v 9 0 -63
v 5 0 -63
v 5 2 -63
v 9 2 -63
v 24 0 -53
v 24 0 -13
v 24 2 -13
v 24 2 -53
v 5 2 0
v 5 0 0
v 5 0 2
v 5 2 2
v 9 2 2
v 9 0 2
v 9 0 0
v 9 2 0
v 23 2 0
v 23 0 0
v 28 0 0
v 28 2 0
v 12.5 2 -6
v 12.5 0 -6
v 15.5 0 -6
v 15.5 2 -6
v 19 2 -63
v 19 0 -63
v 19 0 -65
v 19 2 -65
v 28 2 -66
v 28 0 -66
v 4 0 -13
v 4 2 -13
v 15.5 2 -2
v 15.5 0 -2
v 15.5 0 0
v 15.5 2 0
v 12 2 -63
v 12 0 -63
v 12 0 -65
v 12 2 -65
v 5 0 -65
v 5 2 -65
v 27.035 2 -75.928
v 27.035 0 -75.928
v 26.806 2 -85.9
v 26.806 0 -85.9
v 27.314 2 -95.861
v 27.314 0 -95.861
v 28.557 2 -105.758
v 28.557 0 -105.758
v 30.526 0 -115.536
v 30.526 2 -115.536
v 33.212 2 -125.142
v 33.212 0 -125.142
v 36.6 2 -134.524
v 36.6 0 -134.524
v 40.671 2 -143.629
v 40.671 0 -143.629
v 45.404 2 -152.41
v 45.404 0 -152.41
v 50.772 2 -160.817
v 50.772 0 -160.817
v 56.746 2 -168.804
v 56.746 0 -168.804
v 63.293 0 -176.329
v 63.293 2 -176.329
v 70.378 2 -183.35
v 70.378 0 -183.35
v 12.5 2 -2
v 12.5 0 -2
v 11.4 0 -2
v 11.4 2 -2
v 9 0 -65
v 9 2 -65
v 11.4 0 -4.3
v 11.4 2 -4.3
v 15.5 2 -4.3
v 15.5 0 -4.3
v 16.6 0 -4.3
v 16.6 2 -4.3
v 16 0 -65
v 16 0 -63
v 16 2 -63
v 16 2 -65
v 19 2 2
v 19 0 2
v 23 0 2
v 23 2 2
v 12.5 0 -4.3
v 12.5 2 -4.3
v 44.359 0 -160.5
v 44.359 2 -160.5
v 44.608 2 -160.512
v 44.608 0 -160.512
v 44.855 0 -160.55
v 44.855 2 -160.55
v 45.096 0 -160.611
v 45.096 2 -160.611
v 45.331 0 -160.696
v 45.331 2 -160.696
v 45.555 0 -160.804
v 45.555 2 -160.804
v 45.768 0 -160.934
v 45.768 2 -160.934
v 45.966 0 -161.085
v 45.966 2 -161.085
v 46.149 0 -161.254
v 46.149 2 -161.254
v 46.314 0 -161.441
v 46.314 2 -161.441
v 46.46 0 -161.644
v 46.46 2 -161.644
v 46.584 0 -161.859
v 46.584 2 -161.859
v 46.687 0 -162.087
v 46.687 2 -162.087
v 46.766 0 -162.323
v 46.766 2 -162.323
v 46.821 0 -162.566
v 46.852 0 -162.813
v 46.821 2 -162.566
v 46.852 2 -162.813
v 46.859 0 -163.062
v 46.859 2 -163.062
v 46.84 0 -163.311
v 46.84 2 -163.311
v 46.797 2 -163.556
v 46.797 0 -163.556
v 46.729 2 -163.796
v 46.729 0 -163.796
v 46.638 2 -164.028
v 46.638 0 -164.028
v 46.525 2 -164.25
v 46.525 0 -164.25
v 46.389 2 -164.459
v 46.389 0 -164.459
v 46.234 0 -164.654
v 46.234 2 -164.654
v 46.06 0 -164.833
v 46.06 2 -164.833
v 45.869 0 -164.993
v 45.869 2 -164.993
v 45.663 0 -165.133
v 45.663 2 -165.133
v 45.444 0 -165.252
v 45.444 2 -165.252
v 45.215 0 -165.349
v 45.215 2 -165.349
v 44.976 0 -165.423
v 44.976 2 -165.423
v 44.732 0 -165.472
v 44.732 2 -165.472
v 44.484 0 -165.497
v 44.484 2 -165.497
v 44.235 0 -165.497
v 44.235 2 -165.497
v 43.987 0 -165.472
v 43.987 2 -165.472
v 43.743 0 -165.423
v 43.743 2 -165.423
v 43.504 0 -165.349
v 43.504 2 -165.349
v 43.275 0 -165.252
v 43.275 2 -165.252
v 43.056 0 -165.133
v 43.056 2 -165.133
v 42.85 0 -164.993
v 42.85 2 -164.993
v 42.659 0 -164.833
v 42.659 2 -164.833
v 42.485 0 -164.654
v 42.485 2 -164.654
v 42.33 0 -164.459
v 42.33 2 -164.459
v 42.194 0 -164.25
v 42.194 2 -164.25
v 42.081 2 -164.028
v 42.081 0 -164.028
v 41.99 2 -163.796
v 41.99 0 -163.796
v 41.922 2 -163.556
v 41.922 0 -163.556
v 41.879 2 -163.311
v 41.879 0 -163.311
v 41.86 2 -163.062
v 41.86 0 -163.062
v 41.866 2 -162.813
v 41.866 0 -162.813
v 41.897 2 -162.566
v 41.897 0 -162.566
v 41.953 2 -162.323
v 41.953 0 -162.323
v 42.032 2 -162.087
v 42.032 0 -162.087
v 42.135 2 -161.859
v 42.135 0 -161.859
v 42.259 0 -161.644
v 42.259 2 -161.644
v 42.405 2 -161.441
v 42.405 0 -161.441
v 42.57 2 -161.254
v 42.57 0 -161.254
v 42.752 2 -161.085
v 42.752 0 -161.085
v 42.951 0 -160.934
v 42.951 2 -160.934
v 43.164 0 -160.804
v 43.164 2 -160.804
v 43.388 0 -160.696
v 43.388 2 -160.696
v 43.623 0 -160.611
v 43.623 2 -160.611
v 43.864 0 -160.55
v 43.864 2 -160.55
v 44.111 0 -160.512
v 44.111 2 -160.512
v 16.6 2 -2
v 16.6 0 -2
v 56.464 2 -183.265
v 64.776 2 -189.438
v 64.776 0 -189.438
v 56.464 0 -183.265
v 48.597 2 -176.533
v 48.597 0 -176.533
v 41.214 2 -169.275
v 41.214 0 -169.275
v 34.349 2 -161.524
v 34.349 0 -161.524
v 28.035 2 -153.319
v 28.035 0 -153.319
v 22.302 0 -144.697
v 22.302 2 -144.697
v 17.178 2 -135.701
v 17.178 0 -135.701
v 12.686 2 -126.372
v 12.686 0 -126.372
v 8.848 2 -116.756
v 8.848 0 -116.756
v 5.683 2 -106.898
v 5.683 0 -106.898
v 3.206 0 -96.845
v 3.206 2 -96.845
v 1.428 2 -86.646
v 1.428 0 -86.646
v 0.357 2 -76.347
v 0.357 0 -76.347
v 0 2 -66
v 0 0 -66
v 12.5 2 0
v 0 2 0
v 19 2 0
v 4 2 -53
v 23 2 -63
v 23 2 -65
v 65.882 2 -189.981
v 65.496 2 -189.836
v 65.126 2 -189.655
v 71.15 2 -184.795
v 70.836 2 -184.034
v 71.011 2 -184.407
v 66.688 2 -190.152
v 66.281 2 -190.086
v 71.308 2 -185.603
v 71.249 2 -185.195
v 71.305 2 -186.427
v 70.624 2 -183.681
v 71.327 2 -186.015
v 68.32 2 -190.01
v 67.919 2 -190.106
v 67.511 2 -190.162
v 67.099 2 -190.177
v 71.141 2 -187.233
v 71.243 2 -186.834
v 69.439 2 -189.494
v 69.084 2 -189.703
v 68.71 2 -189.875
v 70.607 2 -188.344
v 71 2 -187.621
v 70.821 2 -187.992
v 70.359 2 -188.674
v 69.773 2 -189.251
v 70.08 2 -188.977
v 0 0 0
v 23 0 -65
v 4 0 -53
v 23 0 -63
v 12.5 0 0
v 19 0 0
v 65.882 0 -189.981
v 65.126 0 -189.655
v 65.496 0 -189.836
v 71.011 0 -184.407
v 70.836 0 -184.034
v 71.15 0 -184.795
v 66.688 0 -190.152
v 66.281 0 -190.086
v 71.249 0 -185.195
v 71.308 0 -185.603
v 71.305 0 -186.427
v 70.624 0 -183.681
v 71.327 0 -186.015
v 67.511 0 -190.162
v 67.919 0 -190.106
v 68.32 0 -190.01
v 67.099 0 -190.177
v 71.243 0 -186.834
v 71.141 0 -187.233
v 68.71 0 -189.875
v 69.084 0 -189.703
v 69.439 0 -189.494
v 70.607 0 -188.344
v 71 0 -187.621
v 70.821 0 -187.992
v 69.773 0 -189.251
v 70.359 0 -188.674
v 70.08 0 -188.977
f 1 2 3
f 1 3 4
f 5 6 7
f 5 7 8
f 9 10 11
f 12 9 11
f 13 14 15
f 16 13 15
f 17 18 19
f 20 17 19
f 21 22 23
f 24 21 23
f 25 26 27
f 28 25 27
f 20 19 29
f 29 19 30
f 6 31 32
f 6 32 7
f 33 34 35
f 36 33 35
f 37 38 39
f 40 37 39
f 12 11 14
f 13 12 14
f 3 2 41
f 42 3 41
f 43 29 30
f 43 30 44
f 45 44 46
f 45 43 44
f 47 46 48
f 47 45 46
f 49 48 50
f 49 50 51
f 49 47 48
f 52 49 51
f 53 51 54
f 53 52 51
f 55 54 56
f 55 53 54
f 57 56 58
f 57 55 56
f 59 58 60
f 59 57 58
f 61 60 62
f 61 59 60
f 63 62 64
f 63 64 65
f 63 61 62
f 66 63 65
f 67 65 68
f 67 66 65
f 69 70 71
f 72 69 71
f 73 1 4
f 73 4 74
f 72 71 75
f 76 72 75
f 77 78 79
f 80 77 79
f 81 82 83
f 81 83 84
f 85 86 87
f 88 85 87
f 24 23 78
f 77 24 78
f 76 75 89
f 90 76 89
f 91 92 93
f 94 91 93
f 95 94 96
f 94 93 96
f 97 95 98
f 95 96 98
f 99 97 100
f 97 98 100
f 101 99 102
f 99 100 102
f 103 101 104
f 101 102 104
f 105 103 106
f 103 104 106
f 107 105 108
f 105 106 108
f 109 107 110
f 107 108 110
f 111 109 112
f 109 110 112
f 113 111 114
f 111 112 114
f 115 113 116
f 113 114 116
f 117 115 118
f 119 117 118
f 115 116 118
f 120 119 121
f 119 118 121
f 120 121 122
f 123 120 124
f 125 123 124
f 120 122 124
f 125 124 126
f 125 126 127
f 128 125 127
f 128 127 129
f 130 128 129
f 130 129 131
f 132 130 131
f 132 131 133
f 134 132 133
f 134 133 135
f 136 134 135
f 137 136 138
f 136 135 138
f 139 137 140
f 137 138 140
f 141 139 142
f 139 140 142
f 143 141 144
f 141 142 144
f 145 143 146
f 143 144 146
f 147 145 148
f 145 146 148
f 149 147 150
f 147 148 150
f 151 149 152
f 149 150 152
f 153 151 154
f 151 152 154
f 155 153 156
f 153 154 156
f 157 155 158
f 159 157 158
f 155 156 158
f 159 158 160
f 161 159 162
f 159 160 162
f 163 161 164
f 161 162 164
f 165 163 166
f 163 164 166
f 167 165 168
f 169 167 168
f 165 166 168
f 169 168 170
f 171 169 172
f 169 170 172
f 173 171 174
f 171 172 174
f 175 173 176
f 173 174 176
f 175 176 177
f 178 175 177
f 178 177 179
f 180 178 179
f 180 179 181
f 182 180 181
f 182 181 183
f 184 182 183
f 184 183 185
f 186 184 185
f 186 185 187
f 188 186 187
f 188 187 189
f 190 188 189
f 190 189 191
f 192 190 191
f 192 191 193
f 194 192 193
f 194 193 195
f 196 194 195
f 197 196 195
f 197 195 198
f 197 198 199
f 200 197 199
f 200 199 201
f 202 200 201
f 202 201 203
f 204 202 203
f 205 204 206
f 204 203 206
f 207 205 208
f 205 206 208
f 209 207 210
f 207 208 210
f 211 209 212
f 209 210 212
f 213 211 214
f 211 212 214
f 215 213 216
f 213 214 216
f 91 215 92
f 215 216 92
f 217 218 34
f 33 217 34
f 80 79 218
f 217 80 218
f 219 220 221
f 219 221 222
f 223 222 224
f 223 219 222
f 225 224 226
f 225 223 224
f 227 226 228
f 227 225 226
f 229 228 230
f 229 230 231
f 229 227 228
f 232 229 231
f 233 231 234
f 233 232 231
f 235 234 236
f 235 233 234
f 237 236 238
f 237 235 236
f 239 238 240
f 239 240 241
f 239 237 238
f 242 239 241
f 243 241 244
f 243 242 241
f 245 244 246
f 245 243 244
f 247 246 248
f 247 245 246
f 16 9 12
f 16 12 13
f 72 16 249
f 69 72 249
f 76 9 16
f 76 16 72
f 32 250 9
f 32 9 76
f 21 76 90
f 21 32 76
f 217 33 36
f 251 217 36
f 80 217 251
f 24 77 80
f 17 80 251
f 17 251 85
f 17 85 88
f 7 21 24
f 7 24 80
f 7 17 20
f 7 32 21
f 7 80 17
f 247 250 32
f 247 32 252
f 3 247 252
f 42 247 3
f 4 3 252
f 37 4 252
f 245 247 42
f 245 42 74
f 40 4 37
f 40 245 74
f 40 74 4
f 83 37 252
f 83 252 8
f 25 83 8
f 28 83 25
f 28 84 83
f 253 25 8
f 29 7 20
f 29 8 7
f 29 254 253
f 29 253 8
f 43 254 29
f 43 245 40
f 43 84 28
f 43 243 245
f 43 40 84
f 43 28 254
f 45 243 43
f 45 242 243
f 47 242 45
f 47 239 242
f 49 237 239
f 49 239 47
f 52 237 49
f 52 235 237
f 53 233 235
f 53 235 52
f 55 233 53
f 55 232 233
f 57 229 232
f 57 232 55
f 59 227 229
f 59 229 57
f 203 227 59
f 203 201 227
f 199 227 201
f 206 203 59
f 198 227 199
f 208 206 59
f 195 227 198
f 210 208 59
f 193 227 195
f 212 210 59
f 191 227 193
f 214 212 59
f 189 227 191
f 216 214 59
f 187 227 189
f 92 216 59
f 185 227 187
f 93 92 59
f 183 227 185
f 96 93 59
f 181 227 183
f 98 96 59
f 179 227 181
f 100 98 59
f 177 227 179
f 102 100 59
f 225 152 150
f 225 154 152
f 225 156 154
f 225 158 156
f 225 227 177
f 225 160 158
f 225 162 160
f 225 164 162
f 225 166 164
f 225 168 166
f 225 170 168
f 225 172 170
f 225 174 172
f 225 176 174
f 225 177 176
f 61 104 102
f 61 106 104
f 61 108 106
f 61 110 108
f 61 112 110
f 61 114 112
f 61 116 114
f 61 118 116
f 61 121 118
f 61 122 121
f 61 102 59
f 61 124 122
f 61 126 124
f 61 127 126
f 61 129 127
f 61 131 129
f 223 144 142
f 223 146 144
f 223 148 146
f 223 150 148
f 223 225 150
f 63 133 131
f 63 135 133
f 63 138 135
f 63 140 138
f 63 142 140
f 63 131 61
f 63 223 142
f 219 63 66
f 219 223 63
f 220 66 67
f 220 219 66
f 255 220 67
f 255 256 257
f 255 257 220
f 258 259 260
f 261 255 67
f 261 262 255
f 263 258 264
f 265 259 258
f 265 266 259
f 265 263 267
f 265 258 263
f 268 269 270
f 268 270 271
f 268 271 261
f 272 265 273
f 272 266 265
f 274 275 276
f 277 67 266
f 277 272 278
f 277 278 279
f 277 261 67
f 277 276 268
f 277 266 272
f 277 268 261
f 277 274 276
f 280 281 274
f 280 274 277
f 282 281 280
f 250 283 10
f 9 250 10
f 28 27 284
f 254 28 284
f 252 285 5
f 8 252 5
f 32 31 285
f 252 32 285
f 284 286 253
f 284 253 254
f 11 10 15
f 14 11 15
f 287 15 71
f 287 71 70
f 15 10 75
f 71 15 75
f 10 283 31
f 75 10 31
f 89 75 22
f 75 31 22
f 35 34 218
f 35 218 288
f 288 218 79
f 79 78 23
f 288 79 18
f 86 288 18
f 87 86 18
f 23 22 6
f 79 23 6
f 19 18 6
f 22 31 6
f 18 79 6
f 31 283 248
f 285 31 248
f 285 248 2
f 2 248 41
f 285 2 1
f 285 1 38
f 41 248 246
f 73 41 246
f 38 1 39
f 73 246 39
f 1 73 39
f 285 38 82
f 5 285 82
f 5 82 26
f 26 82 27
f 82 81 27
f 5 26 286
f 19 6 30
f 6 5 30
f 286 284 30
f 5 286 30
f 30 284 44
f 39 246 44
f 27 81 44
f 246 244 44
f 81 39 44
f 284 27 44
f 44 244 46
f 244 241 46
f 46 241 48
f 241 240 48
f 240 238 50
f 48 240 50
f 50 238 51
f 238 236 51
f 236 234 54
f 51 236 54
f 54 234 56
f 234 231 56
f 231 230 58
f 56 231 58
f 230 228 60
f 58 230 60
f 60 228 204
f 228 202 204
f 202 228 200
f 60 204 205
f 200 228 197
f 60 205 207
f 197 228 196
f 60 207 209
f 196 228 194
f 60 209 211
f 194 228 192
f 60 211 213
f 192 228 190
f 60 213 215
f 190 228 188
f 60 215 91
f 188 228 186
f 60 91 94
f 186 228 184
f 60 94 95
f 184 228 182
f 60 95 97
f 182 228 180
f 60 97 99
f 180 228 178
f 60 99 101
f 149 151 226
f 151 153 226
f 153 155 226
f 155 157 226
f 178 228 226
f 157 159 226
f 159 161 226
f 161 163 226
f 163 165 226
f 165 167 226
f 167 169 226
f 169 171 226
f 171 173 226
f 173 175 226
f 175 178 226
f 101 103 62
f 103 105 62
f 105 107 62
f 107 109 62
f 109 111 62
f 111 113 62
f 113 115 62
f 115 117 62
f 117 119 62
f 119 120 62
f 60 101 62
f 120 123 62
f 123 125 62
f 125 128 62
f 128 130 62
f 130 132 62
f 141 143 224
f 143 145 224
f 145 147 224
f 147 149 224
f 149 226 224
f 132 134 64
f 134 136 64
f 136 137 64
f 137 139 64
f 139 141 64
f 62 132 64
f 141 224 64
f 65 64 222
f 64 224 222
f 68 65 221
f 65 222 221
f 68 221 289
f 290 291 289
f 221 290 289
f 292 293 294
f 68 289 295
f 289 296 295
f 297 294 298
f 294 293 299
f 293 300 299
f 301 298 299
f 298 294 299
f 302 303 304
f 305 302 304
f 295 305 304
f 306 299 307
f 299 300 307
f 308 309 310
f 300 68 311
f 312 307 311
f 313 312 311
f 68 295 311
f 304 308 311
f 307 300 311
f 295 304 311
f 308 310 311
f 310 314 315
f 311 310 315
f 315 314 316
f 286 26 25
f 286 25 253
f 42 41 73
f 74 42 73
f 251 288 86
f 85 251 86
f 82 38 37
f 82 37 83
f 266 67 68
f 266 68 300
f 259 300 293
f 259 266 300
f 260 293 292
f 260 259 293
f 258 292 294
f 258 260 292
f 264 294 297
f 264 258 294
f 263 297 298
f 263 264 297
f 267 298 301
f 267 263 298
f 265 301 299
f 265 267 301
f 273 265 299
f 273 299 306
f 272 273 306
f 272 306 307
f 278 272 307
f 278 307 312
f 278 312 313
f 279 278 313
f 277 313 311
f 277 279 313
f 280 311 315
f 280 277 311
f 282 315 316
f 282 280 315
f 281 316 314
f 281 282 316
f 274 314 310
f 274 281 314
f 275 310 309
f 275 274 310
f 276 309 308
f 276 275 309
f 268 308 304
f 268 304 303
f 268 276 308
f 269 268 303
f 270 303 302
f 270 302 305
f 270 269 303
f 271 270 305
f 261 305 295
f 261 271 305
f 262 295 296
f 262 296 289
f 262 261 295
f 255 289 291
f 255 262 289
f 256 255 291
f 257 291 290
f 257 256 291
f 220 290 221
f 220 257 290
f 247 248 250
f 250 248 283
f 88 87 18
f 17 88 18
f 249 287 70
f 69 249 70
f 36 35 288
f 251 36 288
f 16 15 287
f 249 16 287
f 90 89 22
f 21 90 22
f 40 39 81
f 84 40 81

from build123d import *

# Parameters (mm, degrees)
SKETCH1_W           = 20
SKETCH1_H           = 40
SKETCH1_W_2         = 4
SKETCH1_H_2         = 2
BOSS_EXTRUDE1_DEPTH = 2
BOSS_EXTRUDE2_DEPTH = 2
SKETCH3_R           = 2.5
CUT_EXTRUDE1_DEPTH  = 2


with BuildPart() as part:
    # Sketch1 → Boss-Extrude1 (new body)
    with BuildSketch(Plane(origin=(0, 0, 0), x_dir=(1, 0, 0), z_dir=(0, 1, 0))):
        Polygon((0, 0), (5, 0), (5, -2), (9, -2), (9, 0), (12.5, 0), (12.5, 2), (11.4, 2), (11.4, 4.3), (12.5, 4.3), (12.5, 6), (15.5, 6), (15.5, 4.3), (16.6, 4.3), (16.6, 2), (15.5, 2), (15.5, 0), (19, 0), (19, -2), (23, -2), (23, 0), (28, 0), (28, 66), (0, 66), align=None)
        with Locations((14, 33)):
            Rectangle(SKETCH1_W, SKETCH1_H, mode=Mode.SUBTRACT)
        with Locations((7, 64)):
            Rectangle(SKETCH1_W_2, SKETCH1_H_2, mode=Mode.SUBTRACT)
        with Locations((21, 64)):
            Rectangle(SKETCH1_W_2, SKETCH1_H_2, mode=Mode.SUBTRACT)
        with Locations((14, 64)):
            Rectangle(SKETCH1_W_2, SKETCH1_H_2, mode=Mode.SUBTRACT)
    extrude(amount=BOSS_EXTRUDE1_DEPTH)

    # Sketch2 → Boss-Extrude2 (add)
    with BuildSketch(Plane(origin=(0, 2, 0), x_dir=(1, 0, 0), z_dir=(0, 1, 0))):
        with BuildLine():
            Line((0, 66), (28, 66))
            ThreePointArc((28, 66), (34.819271185, 129.864214399), (70.378490249, 183.349560802))
            ThreePointArc((70.378490249, 183.349560802), (70.223472253, 188.82876401), (64.776007814, 189.43772177))
            ThreePointArc((64.776007814, 189.43772177), (17.177564343, 135.700793296), (0, 66))
        make_face()
    extrude(amount=-BOSS_EXTRUDE2_DEPTH)

    # Sketch3 → Cut-Extrude1 (cut)
    with BuildSketch(Plane(origin=(0, 2, 0), x_dir=(1, 0, 0), z_dir=(0, 1, 0))):
        with Locations(Location((44.359461926, 163, 0), (0, 0, 270))):
            Circle(SKETCH3_R)
    extrude(amount=-CUT_EXTRUDE1_DEPTH, mode=Mode.SUBTRACT)


solid = part.part
